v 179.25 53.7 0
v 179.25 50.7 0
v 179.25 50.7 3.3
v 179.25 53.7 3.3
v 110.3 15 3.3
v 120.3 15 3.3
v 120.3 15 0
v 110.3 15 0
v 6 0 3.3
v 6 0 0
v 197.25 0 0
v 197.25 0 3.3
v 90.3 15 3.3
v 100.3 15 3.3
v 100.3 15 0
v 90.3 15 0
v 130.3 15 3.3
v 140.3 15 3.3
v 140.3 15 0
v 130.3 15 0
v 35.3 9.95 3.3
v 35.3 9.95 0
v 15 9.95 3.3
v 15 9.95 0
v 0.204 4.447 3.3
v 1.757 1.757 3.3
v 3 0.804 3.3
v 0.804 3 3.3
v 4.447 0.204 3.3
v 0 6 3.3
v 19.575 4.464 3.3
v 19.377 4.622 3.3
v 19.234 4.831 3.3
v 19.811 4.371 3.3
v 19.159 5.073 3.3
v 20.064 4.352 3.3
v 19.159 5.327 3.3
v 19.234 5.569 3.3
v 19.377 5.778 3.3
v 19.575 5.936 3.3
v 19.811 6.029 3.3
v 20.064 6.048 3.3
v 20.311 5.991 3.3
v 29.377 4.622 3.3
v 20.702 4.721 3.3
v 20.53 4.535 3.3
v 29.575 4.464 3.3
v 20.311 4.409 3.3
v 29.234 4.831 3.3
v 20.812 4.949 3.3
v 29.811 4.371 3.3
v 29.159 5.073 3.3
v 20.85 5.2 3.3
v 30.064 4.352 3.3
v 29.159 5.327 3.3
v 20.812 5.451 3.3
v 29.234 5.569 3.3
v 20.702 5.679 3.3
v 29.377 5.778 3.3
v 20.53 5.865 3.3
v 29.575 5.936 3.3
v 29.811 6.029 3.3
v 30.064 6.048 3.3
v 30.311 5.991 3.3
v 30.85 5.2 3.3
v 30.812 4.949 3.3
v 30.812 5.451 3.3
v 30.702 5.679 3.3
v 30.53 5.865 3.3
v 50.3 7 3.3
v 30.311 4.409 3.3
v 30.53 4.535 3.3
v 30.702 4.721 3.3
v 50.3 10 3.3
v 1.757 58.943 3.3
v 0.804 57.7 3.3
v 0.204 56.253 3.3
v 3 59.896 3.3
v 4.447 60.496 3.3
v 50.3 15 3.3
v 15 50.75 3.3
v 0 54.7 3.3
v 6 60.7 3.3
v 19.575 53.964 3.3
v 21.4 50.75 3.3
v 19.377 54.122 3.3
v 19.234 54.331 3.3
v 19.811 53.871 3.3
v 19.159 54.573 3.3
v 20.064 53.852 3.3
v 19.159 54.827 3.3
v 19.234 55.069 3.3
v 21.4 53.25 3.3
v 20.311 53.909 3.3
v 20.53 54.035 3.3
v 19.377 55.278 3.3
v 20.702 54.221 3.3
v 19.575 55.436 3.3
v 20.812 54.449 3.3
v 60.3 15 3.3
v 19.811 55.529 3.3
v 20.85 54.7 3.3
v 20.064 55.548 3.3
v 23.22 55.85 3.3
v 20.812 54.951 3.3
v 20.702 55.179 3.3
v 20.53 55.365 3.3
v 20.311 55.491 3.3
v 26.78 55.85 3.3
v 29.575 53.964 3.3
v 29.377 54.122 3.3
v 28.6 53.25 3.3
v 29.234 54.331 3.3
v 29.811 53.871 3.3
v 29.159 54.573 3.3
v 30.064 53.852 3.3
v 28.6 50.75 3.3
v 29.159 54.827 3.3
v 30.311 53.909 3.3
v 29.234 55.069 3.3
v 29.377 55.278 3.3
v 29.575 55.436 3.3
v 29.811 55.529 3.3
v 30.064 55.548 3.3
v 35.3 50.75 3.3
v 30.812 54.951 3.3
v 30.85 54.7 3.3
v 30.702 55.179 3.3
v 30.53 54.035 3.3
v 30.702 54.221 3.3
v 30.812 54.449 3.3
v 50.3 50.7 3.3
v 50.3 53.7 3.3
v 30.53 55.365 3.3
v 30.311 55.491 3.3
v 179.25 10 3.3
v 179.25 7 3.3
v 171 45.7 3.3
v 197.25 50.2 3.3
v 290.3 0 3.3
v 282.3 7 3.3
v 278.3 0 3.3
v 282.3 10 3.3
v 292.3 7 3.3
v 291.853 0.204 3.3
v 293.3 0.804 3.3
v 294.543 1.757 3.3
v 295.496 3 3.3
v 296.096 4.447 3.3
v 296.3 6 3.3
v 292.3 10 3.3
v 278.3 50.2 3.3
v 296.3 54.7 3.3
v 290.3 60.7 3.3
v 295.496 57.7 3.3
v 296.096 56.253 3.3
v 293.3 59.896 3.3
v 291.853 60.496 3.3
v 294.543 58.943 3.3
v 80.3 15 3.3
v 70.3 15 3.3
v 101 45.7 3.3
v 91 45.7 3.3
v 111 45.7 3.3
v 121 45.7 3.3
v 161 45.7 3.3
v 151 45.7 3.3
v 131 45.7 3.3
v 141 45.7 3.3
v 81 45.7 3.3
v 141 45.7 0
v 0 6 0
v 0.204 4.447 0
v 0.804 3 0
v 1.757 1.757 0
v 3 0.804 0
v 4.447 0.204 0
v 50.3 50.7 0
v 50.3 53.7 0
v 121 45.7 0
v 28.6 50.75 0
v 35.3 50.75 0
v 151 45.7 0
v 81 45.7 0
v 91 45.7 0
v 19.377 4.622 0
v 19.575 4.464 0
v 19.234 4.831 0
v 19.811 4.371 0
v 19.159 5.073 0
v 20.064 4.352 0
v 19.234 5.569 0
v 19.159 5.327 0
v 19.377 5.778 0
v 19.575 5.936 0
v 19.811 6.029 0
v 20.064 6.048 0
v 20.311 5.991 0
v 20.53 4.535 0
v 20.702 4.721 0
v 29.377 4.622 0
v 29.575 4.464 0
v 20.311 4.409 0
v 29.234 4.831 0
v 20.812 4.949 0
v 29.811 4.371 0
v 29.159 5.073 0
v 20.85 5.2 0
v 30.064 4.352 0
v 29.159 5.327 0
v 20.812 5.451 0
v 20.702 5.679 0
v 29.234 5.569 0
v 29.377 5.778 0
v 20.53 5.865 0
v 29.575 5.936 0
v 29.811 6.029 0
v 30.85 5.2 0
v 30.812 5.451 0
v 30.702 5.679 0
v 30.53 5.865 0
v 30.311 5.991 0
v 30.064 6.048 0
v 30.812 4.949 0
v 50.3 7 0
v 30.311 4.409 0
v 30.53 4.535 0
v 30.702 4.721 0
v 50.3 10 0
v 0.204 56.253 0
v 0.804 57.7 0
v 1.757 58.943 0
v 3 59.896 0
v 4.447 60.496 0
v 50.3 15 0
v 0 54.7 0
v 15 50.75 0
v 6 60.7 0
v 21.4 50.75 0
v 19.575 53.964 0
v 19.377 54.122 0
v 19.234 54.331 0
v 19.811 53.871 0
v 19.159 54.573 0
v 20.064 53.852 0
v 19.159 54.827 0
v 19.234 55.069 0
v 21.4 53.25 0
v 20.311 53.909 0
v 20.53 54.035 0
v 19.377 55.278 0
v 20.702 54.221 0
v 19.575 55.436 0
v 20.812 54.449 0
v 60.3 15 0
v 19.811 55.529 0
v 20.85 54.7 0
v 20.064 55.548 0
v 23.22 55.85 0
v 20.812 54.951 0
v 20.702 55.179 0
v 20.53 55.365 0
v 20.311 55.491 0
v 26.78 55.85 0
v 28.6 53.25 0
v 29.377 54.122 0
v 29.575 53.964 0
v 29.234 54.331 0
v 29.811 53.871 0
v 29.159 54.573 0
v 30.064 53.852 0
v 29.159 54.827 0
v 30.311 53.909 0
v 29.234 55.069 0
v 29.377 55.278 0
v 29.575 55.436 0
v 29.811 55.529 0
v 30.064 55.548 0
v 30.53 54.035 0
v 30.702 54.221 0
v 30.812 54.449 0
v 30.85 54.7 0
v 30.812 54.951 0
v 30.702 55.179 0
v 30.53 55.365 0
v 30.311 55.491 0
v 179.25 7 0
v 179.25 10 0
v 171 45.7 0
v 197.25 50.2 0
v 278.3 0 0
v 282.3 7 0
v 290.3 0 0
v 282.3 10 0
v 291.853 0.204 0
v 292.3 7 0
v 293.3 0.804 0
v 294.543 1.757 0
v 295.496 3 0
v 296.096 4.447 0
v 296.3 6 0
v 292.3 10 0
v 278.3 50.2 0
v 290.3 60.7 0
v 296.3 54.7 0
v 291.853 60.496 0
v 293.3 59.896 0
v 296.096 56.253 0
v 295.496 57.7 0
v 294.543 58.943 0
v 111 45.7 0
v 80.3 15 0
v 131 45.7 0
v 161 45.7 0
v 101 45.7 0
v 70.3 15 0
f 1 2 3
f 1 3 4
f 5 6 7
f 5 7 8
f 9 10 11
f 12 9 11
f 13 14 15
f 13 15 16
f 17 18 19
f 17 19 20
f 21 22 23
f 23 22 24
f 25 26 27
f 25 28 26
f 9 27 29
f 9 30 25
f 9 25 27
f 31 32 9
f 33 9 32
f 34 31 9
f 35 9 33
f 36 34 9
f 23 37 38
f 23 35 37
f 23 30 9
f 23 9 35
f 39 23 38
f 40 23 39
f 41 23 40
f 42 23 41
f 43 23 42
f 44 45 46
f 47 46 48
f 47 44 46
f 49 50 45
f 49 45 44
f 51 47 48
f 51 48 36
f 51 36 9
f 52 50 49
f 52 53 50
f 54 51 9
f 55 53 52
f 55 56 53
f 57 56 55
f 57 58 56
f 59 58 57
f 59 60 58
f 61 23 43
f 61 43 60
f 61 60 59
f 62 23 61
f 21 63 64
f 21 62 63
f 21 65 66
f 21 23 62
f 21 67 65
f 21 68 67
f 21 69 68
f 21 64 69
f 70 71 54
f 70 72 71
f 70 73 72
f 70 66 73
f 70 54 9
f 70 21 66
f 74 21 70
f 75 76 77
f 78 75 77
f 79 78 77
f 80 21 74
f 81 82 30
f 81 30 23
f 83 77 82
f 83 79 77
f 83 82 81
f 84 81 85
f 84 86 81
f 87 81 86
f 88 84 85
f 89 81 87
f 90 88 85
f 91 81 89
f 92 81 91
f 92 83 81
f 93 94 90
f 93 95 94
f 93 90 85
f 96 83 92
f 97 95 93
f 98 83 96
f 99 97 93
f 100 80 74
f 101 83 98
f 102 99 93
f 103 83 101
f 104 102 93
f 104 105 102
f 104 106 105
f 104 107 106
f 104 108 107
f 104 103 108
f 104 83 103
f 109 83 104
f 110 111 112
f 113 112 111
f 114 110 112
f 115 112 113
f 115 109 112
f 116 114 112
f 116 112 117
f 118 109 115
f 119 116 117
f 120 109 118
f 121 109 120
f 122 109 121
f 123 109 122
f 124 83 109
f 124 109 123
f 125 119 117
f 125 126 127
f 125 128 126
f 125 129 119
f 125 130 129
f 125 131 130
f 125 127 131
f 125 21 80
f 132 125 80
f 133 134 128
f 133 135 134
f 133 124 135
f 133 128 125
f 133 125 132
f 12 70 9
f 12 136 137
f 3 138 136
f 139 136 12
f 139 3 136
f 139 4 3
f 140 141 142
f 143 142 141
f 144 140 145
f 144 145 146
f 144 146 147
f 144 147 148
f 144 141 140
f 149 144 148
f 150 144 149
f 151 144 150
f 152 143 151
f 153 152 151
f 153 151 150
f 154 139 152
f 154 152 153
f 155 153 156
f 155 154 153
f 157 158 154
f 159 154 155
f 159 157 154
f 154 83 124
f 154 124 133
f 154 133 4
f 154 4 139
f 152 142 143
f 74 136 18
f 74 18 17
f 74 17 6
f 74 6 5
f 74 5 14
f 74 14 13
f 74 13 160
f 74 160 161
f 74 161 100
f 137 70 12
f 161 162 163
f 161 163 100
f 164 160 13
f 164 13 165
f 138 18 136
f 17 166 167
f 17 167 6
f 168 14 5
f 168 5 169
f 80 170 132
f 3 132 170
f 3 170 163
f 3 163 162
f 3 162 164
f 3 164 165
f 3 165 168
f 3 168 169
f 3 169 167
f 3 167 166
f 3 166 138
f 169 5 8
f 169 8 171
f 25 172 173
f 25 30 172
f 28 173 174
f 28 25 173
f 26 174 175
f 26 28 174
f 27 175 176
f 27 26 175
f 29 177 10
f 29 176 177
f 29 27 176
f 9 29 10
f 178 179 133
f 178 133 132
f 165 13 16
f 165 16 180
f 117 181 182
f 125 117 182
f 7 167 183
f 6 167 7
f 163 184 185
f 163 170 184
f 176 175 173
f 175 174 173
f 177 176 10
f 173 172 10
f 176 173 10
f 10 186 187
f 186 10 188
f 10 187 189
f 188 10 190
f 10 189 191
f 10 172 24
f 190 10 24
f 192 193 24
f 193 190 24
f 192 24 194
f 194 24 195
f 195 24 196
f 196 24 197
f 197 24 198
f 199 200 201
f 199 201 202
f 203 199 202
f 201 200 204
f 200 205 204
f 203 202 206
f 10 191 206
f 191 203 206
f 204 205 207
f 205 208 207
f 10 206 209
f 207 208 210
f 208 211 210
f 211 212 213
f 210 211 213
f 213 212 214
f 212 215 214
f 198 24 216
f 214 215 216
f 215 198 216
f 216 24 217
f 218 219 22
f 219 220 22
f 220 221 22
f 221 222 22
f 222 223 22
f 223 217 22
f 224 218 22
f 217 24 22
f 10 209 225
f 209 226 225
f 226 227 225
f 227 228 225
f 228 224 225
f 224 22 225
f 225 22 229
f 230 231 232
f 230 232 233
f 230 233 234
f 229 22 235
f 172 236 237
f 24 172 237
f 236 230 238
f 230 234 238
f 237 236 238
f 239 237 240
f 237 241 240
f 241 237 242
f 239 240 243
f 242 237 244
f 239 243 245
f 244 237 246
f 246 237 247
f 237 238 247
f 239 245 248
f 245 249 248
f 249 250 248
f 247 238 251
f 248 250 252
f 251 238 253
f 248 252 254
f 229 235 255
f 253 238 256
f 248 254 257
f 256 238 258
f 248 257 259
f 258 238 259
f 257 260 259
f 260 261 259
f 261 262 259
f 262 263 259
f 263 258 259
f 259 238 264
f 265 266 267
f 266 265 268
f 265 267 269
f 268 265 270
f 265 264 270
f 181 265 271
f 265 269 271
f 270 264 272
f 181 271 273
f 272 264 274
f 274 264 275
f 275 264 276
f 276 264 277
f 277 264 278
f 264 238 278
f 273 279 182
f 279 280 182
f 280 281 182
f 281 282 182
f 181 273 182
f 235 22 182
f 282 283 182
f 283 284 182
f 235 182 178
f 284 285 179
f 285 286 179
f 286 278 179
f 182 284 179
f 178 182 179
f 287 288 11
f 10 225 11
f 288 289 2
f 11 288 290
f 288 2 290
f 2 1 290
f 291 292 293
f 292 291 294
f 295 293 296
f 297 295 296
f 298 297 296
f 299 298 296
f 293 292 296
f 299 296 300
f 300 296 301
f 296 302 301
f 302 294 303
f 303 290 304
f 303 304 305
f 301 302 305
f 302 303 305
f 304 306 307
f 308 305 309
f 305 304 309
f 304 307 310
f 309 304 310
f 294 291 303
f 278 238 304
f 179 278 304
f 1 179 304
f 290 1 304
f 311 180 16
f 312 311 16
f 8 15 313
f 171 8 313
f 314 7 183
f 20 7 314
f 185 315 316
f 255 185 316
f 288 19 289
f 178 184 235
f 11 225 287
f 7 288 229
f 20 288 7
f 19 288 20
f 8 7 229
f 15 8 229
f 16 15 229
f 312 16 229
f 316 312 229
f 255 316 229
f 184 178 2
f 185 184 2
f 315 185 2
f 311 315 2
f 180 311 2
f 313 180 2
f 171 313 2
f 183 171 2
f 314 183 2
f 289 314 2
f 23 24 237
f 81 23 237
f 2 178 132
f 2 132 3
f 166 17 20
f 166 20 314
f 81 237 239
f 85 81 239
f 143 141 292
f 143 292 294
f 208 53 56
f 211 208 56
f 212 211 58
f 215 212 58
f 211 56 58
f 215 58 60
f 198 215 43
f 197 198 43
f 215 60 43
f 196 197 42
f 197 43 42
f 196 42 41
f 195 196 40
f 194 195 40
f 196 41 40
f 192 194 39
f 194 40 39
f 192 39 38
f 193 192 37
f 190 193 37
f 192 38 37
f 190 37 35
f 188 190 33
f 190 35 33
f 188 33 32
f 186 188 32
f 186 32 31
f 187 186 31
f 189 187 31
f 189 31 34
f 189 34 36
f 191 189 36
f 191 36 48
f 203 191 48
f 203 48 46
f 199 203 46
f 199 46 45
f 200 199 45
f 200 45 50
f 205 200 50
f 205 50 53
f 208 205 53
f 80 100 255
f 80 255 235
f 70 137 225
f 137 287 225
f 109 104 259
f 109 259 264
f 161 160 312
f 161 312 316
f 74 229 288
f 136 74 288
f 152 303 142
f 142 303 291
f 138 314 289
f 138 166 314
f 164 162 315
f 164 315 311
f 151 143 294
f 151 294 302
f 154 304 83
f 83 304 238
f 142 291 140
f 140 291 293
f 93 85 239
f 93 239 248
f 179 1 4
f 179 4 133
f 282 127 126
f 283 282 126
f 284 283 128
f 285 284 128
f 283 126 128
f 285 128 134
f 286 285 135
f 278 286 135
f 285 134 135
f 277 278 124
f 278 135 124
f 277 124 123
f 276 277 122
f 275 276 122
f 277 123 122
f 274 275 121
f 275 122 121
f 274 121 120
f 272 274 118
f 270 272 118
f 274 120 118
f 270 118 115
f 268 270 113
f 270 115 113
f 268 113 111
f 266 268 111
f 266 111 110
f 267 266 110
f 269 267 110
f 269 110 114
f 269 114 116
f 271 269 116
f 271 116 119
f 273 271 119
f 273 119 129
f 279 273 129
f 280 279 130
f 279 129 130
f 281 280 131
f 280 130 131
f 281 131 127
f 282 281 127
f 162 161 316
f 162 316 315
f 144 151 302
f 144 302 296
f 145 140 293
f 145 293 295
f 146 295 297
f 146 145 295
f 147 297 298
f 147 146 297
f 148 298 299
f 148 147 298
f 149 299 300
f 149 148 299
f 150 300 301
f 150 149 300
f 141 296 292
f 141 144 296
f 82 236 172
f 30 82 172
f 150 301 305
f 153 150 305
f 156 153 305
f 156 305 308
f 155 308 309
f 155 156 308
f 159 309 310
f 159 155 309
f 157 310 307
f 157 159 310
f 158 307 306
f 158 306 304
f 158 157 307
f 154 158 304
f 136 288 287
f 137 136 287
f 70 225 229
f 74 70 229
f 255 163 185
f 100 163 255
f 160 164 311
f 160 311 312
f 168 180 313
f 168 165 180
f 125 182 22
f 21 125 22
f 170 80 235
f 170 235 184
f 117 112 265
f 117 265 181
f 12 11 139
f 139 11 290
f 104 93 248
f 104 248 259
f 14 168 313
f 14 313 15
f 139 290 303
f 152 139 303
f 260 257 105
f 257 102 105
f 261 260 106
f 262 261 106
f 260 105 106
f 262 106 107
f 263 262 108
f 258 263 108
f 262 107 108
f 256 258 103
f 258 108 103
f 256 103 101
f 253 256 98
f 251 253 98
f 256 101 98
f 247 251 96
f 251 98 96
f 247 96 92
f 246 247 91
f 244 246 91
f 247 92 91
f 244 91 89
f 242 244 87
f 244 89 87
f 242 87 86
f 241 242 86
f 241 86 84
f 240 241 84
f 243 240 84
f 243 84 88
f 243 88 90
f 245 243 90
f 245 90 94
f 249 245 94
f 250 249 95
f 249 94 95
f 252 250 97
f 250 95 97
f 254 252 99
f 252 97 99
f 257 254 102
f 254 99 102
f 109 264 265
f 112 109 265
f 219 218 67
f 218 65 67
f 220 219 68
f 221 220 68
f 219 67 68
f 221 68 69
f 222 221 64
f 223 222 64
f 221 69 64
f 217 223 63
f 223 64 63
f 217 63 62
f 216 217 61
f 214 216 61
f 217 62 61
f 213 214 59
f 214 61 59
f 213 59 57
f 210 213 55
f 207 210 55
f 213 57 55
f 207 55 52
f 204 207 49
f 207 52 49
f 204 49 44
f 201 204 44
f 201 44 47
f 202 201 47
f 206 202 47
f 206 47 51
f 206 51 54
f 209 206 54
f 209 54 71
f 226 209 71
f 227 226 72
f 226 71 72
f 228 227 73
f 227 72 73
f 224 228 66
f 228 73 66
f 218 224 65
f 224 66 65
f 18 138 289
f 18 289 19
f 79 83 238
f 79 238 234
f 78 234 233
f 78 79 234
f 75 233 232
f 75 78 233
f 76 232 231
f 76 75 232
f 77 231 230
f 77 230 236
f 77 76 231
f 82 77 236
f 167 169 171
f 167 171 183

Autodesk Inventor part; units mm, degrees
ref_plane "YZ Plane" through (0, 0, 0) normal (1, 0, 0) x (0, 1, 0)
ref_plane "XZ Plane" through (0, 0, 0) normal (0, 1, 0) x (-1, 0, 0)
ref_plane "XY Plane" through (0, 0, 0) normal (0, 0, 1) x (1, 0, 0)
sketch "Sketch7" plane through (0, 0, 0) normal (0, 0, 1) x (1, 0, 0)
  line L0 (296.3, 0) -> (296.3, 60.7)
  line L1 (296.3, 60.7) -> (0, 60.7)
  line L2 (0, 60.7) -> (0, 0)
  line L3 (50.3, 10) -> (179.25, 10)
  line L4 (179.25, 10) -> (179.25, 7)
  line L5 (179.25, 7) -> (50.3, 7)
  line L6 (50.3, 7) -> (50.3, 10)
  line L7 (15, 50.75) -> (35.3, 50.75)
  line L8 (35.3, 50.75) -> (35.3, 9.95)
  line L9 (35.3, 9.95) -> (15, 9.95)
  line L10 (15, 9.95) -> (15, 50.75)
  line L11 (50.3, 50.7) -> (179.25, 50.7)
  line L12 (179.25, 50.7) -> (179.25, 53.7)
  line L13 (179.25, 53.7) -> (50.3, 53.7)
  line L14 (50.3, 53.7) -> (50.3, 50.7)
  line L15 (0, 0) -> (197.25, 0)
  line L16 (197.25, 0) -> (197.25, 50.2)
  line L17 (197.25, 50.2) -> (278.3, 50.2)
  line L18 (278.3, 50.2) -> (278.3, 0)
  line L19 (278.3, 0) -> (296.3, 0)
  line L20 (282.3, 10) -> (292.3, 10)
  line L21 (292.3, 10) -> (292.3, 7)
  line L22 (292.3, 7) -> (282.3, 7)
  line L23 (282.3, 7) -> (282.3, 10)
  point P0 (50.3, 52.2)
  point P1 (50.3, 8.5)
  dimension "d154" = 128.95
  dimension "d159" = 3
  dimension "d161" = 40.8
  dimension "d162" = 20.3
  dimension "d163" = 15
  dimension "d168" = 7
  dimension "d224" = 40.7
  dimension "d225" = 15
  dimension "d232" = 60.7
  dimension "d233" = 7
  dimension "d234" = 18
  dimension "d235" = 81.05
  dimension "d236" = 9.95
  dimension "d237" = 10.5
  dimension "d239" = 18
  dimension "d240" = 4
  dimension "d247" = 10
extrude "Extrusion7" add sketch "Sketch7" along normal blind 3.3 contours L19 L18 L17 L16 L15 L2 L1 L0 | L20 L21 L22 L23
fillet "Fillet1" radius 6 4 edges at (0, 60.7, 1.65) (0, 0, 1.65) (296.3, 60.7, 1.65) (296.3, 0, 1.65)
sketch "Sketch9" plane through (0, 0, 3.3) normal (0, 0, 1) x (1, 0, 0)
  arc A0 (290.3, 0) -> (296.3, 6) centre (290.3, 6) ccw projected
  line L0 (296.3, 6) -> (296.3, 54.7) projected
  arc A1 (296.3, 54.7) -> (290.3, 60.7) centre (290.3, 54.7) ccw projected
  line L1 (290.3, 60.7) -> (6, 60.7) projected
  arc A2 (6, 60.7) -> (0, 54.7) centre (6, 54.7) ccw projected
  line L2 (0, 54.7) -> (0, 6) projected
  arc A3 (0, 6) -> (6, 0) centre (6, 6) ccw projected
  line L3 (35.3, 50.75) -> (35.3, 9.95) projected
  line L4 (35.3, 9.95) -> (15, 9.95) projected
  line L5 (15, 9.95) -> (15, 50.75) projected
  line L6 (15, 50.75) -> (35.3, 50.75) projected
  line L7 (50.3, 50.7) -> (50.3, 53.7) projected
  line L8 (50.3, 53.7) -> (179.25, 53.7) projected
  line L9 (179.25, 53.7) -> (179.25, 50.7) projected
  line L10 (179.25, 50.7) -> (50.3, 50.7) projected
  line L11 (179.25, 10) -> (179.25, 7) projected
  line L12 (179.25, 7) -> (50.3, 7) projected
  line L13 (50.3, 7) -> (50.3, 10) projected
  line L14 (50.3, 10) -> (179.25, 10) projected
  line L15 (50.3, 15) -> (81, 45.7)
  line L16 (81, 45.7) -> (91, 45.7)
  line L17 (91, 45.7) -> (60.3, 15)
  line L18 (60.3, 15) -> (50.3, 15)
  line L19 (6, 0) -> (197.25, 0) projected
  line L20 (197.25, 0) -> (197.25, 50.2) projected
  line L21 (197.25, 50.2) -> (278.3, 50.2) projected
  line L22 (278.3, 50.2) -> (278.3, 0) projected
  line L23 (278.3, 0) -> (290.3, 0) projected
  point P0 (0, 0)
  dimension "d172" = 45
  dimension "d173" = 10
  dimension "d175" = 5
  dimension "d182" = 5
extrude "Extrusion8" cut sketch "Sketch9" against normal blind 3.3 contours L15 L16 L17 L18
sketch "Sketch10" plane through (0, 0, 3.3) normal (0, 0, 1) x (1, 0, 0)
  line L0 (15, 9.95) -> (15, 50.75) projected
  line L1 (15, 50.75) -> (35.3, 50.75) projected
  line L2 (35.3, 50.75) -> (35.3, 9.95) projected
  line L3 (35.3, 9.95) -> (15, 9.95) projected
  circle A0 centre (20, 54.7) radius 0.85
  circle A1 centre (30, 54.7) radius 0.85
  circle A2 centre (20, 5.2) radius 0.85
  circle A3 centre (30, 5.2) radius 0.85
  point P0 (0, 0)
  dimension "d183" = 1.7
  dimension "d184" = 5
  dimension "d185" = 10
  dimension "d186" = 5
  dimension "d187" = 10
  dimension "d188" = 3.95
  dimension "d189" = 4.75
extrude "Extrusion9" cut sketch "Sketch10" against normal blind 10 contours A0 | A1 | A2 | A3
sketch "Sketch11" plane through (0, 0, 3.3) normal (0, 0, 1) x (1, 0, 0)
  line L0 (15, 50.75) -> (35.3, 50.75) projected
  line L1 (21.4, 55.85) -> (28.6, 55.85) construction
  line L2 (28.6, 55.85) -> (28.6, 50.75) construction
  line L3 (28.6, 50.75) -> (21.4, 50.75)
  line L4 (21.4, 50.75) -> (21.4, 55.85) construction
  line L5 (15, 9.95) -> (15, 50.75) projected
  line L6 (35.3, 50.75) -> (35.3, 9.95) projected
  line L7 (259.7, 10) -> (259.7, 50.8) projected
  line L8 (21.4, 53.25) -> (23.2205, 55.85)
  line L9 (26.7795, 55.85) -> (28.6, 53.25)
  line L10 (21.4, 50.75) -> (21.4, 53.25)
  line L11 (23.2205, 55.85) -> (26.7795, 55.85)
  line L12 (28.6, 53.25) -> (28.6, 50.75)
  point P0 (0, 0)
  dimension "d203" = 6.4
  dimension "d205" = 5.1
  dimension "d206" = 7.2
  dimension "d215" = 35
  dimension "d216" = 2.5
  dimension "d217" = 35
extrude "Extrusion10" cut sketch "Sketch11" against normal blind 10
sketch "Sketch13" plane through (0, 0, 3.3) normal (0, 0, 1) x (1, 0, 0)
  line L0 (282.3, 10) -> (292.3, 10) projected
  line L1 (292.3, 10) -> (292.3, 7) projected
  line L2 (292.3, 7) -> (282.3, 7) projected
  line L3 (282.3, 7) -> (282.3, 10) projected
  point P0 (0, 0)
extrude "Extrusion11" cut sketch "Sketch13" against normal up to surface (3.3 mm away)
pattern_linear "Rectangular Pattern2" count 5 spacing 20 along (1, 0, 0) of "Extrusion8"
equation "\"base_servo\" = 20"
equation "\"altura_servo\" = 40"
equation "\"agujero_servo\" = 2"
equation "\"distancia_agujero_servo\" = 4.75"
equation "\"largo_base\" = 200"
properties part number "Cuerpo - LateralPrueba"
